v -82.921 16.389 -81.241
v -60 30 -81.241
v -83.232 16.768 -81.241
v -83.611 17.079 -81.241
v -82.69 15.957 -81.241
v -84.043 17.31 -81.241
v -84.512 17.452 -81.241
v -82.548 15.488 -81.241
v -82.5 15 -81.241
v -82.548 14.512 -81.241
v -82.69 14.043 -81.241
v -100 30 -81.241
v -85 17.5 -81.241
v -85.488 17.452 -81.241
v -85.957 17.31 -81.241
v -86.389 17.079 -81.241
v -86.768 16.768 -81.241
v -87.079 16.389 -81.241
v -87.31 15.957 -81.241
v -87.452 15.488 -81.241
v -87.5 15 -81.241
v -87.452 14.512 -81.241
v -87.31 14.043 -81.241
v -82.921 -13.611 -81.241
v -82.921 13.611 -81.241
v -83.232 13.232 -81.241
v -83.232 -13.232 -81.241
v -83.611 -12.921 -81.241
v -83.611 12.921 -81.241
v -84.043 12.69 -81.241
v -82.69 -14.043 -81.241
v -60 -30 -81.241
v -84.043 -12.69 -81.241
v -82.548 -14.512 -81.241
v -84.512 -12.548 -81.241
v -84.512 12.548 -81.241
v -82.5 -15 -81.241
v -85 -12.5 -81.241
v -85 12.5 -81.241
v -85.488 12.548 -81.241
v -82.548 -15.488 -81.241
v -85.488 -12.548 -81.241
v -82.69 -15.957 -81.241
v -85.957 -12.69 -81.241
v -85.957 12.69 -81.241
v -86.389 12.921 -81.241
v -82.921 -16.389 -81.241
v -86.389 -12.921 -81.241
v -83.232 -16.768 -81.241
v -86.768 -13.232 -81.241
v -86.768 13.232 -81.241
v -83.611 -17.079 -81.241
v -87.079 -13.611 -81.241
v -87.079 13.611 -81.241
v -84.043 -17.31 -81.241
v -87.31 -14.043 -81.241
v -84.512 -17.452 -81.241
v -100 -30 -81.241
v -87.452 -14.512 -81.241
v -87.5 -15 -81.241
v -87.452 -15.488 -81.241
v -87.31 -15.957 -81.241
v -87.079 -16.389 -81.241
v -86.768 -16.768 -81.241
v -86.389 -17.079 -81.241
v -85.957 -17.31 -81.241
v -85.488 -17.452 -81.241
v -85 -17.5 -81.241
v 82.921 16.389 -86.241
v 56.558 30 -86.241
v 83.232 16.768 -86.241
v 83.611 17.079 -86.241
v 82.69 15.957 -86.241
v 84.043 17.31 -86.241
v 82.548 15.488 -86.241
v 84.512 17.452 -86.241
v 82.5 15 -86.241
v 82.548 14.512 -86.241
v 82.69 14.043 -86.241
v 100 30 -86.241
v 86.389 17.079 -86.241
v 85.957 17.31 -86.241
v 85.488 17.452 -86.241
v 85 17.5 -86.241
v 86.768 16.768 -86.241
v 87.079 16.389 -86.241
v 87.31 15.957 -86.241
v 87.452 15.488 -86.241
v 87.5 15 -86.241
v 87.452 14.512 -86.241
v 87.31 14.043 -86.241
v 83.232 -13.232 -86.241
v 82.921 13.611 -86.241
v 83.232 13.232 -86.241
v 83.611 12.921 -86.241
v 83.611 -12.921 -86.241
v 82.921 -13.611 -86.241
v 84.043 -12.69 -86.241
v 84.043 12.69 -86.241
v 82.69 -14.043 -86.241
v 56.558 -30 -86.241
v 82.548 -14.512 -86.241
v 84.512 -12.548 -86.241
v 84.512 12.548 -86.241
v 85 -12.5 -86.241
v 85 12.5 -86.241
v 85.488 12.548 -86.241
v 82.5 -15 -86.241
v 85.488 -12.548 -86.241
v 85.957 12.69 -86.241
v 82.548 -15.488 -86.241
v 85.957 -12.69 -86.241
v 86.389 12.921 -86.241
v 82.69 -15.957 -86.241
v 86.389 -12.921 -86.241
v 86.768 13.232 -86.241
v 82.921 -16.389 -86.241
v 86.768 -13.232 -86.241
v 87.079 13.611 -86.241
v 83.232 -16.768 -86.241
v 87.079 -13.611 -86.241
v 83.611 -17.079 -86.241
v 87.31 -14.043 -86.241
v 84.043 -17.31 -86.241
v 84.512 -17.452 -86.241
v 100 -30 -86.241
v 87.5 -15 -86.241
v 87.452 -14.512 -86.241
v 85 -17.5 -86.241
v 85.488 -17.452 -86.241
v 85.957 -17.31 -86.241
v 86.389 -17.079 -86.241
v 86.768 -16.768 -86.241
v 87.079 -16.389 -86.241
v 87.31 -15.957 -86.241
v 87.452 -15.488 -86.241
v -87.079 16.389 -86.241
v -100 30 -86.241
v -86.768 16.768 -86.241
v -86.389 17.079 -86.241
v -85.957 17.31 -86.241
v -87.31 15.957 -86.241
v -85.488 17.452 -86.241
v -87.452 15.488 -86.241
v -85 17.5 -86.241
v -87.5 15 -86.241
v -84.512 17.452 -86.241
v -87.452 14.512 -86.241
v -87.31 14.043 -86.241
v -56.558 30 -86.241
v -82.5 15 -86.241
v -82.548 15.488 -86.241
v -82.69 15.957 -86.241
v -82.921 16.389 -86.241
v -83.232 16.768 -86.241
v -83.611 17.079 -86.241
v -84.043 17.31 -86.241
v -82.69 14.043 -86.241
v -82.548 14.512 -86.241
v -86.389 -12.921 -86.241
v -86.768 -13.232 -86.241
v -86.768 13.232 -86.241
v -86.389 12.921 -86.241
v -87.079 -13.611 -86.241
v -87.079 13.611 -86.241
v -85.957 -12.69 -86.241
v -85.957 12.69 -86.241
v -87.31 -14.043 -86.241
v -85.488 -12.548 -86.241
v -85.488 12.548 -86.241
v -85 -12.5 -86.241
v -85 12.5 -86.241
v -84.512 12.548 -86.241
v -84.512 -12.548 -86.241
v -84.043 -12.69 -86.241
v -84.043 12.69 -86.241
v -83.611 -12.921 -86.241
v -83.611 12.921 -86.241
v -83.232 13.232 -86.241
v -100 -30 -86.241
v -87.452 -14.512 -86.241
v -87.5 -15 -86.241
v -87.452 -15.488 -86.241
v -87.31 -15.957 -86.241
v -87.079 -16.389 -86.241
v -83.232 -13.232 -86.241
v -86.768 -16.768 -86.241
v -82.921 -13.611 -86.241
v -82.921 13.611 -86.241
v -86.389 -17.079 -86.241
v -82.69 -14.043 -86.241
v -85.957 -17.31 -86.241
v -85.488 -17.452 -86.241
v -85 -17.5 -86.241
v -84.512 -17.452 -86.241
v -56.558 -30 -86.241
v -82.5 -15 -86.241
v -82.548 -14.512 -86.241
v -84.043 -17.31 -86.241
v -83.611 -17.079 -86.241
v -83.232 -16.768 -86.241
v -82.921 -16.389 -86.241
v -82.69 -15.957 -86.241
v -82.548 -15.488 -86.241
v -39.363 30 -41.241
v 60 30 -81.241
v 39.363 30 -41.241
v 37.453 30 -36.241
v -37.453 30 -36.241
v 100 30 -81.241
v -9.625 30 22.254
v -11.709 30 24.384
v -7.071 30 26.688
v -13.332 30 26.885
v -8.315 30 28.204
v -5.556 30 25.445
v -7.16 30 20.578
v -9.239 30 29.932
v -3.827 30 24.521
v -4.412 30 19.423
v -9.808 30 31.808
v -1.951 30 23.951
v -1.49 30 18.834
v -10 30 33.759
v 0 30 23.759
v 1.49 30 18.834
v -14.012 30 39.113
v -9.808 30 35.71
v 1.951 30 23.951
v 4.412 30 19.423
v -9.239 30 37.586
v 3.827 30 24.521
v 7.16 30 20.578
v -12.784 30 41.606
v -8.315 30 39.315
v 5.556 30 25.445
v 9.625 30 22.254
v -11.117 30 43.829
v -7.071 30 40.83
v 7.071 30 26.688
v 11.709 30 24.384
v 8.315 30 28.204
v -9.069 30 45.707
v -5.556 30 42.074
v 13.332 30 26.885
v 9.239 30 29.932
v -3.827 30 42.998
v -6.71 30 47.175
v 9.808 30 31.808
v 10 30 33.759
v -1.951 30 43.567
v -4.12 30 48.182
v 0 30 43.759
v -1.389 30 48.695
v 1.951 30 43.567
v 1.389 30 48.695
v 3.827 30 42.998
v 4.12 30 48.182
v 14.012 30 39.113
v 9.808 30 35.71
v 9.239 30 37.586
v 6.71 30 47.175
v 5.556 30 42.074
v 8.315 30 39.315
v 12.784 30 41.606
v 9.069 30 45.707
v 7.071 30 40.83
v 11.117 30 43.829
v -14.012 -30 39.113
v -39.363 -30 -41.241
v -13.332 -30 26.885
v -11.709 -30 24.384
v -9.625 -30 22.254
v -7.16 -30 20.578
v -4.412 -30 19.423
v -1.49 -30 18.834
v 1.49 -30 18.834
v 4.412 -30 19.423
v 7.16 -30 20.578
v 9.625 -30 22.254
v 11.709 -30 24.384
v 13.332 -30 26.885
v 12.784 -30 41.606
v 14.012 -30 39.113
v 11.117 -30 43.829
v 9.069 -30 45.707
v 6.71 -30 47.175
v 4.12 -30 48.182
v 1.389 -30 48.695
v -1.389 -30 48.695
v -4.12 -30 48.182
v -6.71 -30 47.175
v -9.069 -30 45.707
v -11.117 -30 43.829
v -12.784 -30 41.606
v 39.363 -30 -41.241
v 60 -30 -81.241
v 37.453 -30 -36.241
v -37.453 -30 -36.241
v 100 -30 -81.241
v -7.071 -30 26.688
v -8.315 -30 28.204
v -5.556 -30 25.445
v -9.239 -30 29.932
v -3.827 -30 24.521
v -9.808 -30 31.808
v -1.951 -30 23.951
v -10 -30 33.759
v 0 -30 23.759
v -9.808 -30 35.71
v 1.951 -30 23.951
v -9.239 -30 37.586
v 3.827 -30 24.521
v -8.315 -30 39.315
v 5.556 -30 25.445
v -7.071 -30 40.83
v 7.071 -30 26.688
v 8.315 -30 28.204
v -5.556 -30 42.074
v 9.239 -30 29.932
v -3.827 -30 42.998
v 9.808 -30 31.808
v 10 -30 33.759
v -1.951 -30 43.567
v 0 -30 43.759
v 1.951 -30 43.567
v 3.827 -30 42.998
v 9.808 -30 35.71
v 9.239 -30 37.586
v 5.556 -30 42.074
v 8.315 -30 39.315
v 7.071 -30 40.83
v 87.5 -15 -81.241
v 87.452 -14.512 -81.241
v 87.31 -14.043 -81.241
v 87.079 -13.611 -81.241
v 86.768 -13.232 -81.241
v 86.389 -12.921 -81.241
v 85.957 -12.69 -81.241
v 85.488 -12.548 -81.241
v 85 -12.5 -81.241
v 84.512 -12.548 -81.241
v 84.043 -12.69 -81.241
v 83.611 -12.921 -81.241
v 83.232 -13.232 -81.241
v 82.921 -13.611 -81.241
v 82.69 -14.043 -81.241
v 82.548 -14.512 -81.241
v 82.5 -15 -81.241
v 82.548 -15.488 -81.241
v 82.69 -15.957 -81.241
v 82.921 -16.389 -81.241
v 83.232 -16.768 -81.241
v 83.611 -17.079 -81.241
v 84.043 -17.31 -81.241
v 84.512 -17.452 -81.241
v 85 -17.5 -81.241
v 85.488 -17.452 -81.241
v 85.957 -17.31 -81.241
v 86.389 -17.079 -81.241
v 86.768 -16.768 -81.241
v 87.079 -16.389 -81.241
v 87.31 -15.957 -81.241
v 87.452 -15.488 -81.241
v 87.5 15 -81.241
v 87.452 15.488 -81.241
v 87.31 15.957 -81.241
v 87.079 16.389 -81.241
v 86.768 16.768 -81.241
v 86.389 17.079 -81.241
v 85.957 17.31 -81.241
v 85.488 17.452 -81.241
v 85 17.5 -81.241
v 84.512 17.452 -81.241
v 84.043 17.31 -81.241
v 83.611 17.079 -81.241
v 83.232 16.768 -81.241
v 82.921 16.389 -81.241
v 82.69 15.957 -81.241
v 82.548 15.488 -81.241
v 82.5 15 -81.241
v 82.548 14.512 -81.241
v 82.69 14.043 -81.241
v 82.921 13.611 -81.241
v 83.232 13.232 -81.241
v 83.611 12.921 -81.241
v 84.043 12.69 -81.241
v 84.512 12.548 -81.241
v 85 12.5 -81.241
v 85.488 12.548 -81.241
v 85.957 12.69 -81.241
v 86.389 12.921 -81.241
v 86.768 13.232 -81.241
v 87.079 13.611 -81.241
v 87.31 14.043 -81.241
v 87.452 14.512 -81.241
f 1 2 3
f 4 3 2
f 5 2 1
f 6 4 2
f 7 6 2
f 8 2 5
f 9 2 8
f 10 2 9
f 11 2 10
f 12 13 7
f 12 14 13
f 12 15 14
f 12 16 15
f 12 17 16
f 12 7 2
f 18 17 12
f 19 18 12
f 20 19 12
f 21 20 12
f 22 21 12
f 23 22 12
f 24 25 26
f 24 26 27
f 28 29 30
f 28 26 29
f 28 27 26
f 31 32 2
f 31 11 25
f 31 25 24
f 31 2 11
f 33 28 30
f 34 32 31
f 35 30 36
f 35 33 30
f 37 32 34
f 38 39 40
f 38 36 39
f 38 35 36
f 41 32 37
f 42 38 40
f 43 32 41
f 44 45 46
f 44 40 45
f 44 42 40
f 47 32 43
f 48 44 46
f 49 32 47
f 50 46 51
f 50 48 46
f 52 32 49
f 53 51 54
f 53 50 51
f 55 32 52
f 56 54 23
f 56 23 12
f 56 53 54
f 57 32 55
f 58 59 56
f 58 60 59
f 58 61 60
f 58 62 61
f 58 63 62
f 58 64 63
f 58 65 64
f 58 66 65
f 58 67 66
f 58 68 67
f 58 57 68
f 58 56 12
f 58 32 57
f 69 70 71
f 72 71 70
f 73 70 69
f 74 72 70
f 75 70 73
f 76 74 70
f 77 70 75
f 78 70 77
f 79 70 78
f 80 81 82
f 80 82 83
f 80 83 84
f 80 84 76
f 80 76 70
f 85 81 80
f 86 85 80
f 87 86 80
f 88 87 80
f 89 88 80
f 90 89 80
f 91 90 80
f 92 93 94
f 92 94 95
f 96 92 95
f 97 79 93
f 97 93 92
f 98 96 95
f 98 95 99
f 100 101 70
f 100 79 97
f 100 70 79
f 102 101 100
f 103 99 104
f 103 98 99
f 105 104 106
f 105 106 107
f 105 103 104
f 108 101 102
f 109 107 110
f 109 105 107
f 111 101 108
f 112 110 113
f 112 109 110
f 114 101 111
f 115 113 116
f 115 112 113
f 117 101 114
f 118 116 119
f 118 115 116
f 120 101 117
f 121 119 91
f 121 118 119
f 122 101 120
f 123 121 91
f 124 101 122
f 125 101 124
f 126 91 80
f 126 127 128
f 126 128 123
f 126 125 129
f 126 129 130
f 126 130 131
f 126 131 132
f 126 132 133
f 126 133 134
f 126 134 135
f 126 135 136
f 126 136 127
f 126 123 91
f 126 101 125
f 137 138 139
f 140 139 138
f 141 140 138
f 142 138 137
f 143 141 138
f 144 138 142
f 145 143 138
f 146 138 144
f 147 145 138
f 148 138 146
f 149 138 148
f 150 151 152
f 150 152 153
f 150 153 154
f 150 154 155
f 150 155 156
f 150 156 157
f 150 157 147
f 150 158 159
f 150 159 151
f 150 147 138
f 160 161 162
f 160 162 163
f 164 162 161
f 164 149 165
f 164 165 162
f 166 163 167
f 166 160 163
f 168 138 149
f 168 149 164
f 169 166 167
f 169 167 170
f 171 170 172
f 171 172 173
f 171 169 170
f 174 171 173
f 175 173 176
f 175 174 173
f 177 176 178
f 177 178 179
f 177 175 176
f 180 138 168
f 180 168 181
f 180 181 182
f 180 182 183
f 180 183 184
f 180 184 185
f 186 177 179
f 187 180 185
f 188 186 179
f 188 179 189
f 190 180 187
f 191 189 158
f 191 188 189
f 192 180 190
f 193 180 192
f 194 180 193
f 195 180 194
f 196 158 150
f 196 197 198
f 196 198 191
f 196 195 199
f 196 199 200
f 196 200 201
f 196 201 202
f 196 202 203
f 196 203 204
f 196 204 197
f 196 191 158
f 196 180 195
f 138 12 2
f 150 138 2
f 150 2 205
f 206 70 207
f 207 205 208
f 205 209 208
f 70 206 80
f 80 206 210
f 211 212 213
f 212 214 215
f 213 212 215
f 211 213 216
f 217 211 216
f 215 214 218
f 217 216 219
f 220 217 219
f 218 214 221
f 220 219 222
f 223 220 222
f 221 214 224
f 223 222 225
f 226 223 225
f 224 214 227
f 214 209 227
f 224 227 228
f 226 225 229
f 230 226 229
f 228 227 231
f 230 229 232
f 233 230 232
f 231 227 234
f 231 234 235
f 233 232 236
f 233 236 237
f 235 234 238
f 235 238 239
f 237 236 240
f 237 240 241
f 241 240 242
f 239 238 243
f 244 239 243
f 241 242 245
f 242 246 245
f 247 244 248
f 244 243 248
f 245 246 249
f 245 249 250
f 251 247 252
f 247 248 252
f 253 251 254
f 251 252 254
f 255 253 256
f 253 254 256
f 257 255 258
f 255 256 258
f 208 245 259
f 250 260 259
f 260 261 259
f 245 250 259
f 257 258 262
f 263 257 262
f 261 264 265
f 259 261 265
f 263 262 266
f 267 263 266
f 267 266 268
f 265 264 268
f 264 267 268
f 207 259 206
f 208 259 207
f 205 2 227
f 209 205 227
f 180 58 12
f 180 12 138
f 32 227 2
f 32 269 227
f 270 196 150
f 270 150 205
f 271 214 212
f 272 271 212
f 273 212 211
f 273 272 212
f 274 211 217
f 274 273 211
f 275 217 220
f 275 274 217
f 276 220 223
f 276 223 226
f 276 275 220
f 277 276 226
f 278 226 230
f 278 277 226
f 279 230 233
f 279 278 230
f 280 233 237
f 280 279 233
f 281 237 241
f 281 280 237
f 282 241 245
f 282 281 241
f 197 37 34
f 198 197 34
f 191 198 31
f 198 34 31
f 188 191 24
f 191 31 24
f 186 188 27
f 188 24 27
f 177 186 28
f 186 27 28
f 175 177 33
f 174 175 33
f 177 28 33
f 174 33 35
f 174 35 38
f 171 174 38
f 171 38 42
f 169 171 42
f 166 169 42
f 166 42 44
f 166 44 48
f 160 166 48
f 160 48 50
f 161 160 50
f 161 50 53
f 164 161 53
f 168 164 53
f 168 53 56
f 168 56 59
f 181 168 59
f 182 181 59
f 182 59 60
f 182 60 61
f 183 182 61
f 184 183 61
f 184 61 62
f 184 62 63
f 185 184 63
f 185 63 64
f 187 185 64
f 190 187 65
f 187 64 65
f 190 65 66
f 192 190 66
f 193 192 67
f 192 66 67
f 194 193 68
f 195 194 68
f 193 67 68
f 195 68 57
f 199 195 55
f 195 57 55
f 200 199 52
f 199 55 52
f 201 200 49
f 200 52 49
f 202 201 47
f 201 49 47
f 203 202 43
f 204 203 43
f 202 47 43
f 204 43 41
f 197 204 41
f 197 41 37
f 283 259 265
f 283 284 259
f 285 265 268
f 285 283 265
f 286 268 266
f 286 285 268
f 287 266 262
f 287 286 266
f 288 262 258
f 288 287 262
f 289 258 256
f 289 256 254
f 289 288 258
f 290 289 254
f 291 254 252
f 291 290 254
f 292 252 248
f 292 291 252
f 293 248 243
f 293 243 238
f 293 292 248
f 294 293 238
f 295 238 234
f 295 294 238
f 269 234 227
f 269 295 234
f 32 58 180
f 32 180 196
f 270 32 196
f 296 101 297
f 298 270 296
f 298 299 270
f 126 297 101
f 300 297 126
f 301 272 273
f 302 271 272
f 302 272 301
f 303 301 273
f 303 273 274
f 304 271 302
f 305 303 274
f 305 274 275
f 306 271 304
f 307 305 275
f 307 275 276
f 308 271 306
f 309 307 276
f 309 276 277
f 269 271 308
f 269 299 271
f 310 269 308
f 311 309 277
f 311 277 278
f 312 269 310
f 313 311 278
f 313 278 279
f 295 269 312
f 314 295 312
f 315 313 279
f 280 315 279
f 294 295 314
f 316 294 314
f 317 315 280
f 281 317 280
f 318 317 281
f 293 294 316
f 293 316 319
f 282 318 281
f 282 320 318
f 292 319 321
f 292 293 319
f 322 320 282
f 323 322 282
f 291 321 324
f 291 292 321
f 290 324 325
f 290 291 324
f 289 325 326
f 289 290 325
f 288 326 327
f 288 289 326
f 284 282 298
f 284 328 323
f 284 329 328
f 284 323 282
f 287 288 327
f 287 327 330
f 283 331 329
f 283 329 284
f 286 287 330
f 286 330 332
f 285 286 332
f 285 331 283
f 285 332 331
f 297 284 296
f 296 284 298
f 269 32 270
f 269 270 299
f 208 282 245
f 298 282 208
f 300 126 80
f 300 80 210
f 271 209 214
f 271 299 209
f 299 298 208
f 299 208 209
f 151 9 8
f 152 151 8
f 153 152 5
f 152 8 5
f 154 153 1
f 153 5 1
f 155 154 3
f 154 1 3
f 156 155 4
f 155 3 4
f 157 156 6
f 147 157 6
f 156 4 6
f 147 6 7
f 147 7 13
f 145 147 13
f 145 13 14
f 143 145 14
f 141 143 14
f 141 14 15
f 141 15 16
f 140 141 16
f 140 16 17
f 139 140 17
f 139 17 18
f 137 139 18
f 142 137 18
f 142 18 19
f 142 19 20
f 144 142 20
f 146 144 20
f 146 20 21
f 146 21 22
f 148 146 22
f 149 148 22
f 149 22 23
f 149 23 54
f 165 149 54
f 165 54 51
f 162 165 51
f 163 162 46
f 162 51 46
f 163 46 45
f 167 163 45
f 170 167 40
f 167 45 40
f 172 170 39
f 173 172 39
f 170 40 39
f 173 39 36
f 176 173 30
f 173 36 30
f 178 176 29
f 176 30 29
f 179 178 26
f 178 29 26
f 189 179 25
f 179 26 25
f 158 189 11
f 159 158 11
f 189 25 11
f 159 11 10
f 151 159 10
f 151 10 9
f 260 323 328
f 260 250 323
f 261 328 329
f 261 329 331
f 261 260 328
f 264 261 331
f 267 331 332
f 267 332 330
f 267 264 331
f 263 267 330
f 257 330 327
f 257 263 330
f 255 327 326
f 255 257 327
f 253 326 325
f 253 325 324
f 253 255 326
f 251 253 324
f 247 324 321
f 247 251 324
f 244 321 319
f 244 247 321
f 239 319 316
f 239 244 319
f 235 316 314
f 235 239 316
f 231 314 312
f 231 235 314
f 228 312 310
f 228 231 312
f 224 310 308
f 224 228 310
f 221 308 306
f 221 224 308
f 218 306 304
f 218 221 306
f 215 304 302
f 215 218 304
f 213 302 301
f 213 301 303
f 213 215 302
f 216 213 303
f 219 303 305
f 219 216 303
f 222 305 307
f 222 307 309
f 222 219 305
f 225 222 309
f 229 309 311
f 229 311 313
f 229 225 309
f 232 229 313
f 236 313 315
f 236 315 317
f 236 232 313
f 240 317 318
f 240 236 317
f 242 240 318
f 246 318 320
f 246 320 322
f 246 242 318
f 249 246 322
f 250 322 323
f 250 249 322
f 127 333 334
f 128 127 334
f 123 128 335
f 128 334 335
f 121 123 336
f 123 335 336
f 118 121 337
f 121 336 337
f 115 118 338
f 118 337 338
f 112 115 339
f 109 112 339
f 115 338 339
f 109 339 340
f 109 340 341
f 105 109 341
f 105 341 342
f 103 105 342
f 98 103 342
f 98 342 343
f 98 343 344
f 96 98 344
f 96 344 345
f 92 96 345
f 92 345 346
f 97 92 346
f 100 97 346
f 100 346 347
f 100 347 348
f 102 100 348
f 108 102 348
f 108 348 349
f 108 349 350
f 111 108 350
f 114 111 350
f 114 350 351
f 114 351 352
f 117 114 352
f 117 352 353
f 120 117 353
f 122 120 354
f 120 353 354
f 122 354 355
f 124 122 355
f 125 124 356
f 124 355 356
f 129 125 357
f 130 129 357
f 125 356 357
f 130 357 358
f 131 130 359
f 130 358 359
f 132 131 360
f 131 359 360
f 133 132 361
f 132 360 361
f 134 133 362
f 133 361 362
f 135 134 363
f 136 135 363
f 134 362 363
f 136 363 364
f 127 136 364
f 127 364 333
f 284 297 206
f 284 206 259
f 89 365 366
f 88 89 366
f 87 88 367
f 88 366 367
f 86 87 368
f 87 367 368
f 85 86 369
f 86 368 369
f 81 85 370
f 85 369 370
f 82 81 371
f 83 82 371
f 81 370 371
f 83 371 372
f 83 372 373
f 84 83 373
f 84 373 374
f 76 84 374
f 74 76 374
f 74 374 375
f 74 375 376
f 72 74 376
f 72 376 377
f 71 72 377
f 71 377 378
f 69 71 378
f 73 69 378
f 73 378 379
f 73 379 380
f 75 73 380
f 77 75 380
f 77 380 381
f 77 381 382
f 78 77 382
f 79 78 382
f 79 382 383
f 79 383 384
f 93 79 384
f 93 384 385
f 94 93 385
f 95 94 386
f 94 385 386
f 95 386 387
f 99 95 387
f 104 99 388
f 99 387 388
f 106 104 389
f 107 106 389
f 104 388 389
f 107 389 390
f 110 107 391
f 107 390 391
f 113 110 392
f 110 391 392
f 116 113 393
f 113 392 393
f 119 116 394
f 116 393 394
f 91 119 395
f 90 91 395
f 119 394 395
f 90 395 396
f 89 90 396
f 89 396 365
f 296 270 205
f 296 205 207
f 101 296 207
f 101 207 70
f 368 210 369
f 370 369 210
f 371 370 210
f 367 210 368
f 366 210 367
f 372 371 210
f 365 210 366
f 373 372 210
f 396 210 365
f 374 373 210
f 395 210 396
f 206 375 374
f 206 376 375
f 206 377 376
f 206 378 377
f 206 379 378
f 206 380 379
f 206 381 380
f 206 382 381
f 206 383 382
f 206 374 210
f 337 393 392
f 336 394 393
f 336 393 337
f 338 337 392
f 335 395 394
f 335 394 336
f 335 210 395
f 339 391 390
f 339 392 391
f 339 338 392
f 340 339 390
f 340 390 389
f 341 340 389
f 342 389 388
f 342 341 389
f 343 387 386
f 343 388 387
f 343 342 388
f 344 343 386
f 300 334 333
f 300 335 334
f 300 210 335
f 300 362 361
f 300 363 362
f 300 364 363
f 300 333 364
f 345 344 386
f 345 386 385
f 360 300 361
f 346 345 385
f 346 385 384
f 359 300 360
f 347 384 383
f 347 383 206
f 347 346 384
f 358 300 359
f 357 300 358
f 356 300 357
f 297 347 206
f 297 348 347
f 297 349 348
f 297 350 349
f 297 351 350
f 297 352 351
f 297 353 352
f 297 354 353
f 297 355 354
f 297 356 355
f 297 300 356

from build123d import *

# Parameters (mm, degrees)
F0_R     = 10
F1_DEPTH = 30
F2_R     = 2.5
F3_DEPTH = 5.001


with BuildPart() as f1:
    # F0 (on Front) → F1 (new body, symmetric)
    with BuildSketch(Plane.XZ):
        with BuildLine():
            Line((-60, -81.240696), (-100, -81.240696))
            Line((-100, -81.240696), (-100, -86.240696))
            Line((-100, -86.240696), (-56.557951, -86.240696))
            Line((-56.557951, -86.240696), (-39.363156, -41.240696))
            Line((-39.363156, -41.240696), (-37.452623, -36.240696))
            Line((-37.452623, -36.240696), (-13.331959, 26.884796))
            ThreePointArc((-13.331959, 26.884796), (-14.976864, 32.926515), (-14.011929, 39.113354))
            Line((-14.011929, 39.113354), (-60, -81.240696))
        make_face()
        with BuildLine():
            Line((60, -81.240696), (14.011929, 39.113354))
            ThreePointArc((14.011929, 39.113354), (14.750914, 36.481534), (15, 33.759304))
            ThreePointArc((15, 33.759304), (14.577026, 30.222313), (13.331959, 26.884796))
            Line((13.331959, 26.884796), (37.452623, -36.240696))
            Line((37.452623, -36.240696), (39.363156, -41.240696))
            Line((39.363156, -41.240696), (56.557951, -86.240696))
            Line((56.557951, -86.240696), (100, -86.240696))
            Line((100, -86.240696), (100, -81.240696))
            Line((100, -81.240696), (60, -81.240696))
        make_face()
        with BuildLine():
            ThreePointArc((14.011929, 39.113354), (0, 48.759304), (-14.011929, 39.113354))
            ThreePointArc((-14.011929, 39.113354), (-14.976864, 32.926515), (-13.331959, 26.884796))
            ThreePointArc((-13.331959, 26.884796), (0, 18.759304), (13.331959, 26.884796))
            ThreePointArc((13.331959, 26.884796), (14.577026, 30.222313), (15, 33.759304))
            ThreePointArc((15, 33.759304), (14.750914, 36.481534), (14.011929, 39.113354))
        make_face()
        with Locations((0, 33.759304)):
            Circle(F0_R, mode=Mode.SUBTRACT)
        Polygon((-37.452623, -36.240696), (-39.363156, -41.240696), (39.363156, -41.240696), (37.452623, -36.240696), align=None)
    extrude(amount=F1_DEPTH, both=True)

    # F2 (on face) → F3 (cut, through all)
    with BuildSketch(Plane.XY.offset(-81.240696)):
        with Locations((-85, 15)):
            Circle(F2_R)
        with Locations((-85, -15)):
            Circle(F2_R)
        with Locations((85, -15)):
            Circle(F2_R)
        with Locations((85, 15)):
            Circle(F2_R)
    extrude(amount=-F3_DEPTH, mode=Mode.SUBTRACT)


solid = f1.part
